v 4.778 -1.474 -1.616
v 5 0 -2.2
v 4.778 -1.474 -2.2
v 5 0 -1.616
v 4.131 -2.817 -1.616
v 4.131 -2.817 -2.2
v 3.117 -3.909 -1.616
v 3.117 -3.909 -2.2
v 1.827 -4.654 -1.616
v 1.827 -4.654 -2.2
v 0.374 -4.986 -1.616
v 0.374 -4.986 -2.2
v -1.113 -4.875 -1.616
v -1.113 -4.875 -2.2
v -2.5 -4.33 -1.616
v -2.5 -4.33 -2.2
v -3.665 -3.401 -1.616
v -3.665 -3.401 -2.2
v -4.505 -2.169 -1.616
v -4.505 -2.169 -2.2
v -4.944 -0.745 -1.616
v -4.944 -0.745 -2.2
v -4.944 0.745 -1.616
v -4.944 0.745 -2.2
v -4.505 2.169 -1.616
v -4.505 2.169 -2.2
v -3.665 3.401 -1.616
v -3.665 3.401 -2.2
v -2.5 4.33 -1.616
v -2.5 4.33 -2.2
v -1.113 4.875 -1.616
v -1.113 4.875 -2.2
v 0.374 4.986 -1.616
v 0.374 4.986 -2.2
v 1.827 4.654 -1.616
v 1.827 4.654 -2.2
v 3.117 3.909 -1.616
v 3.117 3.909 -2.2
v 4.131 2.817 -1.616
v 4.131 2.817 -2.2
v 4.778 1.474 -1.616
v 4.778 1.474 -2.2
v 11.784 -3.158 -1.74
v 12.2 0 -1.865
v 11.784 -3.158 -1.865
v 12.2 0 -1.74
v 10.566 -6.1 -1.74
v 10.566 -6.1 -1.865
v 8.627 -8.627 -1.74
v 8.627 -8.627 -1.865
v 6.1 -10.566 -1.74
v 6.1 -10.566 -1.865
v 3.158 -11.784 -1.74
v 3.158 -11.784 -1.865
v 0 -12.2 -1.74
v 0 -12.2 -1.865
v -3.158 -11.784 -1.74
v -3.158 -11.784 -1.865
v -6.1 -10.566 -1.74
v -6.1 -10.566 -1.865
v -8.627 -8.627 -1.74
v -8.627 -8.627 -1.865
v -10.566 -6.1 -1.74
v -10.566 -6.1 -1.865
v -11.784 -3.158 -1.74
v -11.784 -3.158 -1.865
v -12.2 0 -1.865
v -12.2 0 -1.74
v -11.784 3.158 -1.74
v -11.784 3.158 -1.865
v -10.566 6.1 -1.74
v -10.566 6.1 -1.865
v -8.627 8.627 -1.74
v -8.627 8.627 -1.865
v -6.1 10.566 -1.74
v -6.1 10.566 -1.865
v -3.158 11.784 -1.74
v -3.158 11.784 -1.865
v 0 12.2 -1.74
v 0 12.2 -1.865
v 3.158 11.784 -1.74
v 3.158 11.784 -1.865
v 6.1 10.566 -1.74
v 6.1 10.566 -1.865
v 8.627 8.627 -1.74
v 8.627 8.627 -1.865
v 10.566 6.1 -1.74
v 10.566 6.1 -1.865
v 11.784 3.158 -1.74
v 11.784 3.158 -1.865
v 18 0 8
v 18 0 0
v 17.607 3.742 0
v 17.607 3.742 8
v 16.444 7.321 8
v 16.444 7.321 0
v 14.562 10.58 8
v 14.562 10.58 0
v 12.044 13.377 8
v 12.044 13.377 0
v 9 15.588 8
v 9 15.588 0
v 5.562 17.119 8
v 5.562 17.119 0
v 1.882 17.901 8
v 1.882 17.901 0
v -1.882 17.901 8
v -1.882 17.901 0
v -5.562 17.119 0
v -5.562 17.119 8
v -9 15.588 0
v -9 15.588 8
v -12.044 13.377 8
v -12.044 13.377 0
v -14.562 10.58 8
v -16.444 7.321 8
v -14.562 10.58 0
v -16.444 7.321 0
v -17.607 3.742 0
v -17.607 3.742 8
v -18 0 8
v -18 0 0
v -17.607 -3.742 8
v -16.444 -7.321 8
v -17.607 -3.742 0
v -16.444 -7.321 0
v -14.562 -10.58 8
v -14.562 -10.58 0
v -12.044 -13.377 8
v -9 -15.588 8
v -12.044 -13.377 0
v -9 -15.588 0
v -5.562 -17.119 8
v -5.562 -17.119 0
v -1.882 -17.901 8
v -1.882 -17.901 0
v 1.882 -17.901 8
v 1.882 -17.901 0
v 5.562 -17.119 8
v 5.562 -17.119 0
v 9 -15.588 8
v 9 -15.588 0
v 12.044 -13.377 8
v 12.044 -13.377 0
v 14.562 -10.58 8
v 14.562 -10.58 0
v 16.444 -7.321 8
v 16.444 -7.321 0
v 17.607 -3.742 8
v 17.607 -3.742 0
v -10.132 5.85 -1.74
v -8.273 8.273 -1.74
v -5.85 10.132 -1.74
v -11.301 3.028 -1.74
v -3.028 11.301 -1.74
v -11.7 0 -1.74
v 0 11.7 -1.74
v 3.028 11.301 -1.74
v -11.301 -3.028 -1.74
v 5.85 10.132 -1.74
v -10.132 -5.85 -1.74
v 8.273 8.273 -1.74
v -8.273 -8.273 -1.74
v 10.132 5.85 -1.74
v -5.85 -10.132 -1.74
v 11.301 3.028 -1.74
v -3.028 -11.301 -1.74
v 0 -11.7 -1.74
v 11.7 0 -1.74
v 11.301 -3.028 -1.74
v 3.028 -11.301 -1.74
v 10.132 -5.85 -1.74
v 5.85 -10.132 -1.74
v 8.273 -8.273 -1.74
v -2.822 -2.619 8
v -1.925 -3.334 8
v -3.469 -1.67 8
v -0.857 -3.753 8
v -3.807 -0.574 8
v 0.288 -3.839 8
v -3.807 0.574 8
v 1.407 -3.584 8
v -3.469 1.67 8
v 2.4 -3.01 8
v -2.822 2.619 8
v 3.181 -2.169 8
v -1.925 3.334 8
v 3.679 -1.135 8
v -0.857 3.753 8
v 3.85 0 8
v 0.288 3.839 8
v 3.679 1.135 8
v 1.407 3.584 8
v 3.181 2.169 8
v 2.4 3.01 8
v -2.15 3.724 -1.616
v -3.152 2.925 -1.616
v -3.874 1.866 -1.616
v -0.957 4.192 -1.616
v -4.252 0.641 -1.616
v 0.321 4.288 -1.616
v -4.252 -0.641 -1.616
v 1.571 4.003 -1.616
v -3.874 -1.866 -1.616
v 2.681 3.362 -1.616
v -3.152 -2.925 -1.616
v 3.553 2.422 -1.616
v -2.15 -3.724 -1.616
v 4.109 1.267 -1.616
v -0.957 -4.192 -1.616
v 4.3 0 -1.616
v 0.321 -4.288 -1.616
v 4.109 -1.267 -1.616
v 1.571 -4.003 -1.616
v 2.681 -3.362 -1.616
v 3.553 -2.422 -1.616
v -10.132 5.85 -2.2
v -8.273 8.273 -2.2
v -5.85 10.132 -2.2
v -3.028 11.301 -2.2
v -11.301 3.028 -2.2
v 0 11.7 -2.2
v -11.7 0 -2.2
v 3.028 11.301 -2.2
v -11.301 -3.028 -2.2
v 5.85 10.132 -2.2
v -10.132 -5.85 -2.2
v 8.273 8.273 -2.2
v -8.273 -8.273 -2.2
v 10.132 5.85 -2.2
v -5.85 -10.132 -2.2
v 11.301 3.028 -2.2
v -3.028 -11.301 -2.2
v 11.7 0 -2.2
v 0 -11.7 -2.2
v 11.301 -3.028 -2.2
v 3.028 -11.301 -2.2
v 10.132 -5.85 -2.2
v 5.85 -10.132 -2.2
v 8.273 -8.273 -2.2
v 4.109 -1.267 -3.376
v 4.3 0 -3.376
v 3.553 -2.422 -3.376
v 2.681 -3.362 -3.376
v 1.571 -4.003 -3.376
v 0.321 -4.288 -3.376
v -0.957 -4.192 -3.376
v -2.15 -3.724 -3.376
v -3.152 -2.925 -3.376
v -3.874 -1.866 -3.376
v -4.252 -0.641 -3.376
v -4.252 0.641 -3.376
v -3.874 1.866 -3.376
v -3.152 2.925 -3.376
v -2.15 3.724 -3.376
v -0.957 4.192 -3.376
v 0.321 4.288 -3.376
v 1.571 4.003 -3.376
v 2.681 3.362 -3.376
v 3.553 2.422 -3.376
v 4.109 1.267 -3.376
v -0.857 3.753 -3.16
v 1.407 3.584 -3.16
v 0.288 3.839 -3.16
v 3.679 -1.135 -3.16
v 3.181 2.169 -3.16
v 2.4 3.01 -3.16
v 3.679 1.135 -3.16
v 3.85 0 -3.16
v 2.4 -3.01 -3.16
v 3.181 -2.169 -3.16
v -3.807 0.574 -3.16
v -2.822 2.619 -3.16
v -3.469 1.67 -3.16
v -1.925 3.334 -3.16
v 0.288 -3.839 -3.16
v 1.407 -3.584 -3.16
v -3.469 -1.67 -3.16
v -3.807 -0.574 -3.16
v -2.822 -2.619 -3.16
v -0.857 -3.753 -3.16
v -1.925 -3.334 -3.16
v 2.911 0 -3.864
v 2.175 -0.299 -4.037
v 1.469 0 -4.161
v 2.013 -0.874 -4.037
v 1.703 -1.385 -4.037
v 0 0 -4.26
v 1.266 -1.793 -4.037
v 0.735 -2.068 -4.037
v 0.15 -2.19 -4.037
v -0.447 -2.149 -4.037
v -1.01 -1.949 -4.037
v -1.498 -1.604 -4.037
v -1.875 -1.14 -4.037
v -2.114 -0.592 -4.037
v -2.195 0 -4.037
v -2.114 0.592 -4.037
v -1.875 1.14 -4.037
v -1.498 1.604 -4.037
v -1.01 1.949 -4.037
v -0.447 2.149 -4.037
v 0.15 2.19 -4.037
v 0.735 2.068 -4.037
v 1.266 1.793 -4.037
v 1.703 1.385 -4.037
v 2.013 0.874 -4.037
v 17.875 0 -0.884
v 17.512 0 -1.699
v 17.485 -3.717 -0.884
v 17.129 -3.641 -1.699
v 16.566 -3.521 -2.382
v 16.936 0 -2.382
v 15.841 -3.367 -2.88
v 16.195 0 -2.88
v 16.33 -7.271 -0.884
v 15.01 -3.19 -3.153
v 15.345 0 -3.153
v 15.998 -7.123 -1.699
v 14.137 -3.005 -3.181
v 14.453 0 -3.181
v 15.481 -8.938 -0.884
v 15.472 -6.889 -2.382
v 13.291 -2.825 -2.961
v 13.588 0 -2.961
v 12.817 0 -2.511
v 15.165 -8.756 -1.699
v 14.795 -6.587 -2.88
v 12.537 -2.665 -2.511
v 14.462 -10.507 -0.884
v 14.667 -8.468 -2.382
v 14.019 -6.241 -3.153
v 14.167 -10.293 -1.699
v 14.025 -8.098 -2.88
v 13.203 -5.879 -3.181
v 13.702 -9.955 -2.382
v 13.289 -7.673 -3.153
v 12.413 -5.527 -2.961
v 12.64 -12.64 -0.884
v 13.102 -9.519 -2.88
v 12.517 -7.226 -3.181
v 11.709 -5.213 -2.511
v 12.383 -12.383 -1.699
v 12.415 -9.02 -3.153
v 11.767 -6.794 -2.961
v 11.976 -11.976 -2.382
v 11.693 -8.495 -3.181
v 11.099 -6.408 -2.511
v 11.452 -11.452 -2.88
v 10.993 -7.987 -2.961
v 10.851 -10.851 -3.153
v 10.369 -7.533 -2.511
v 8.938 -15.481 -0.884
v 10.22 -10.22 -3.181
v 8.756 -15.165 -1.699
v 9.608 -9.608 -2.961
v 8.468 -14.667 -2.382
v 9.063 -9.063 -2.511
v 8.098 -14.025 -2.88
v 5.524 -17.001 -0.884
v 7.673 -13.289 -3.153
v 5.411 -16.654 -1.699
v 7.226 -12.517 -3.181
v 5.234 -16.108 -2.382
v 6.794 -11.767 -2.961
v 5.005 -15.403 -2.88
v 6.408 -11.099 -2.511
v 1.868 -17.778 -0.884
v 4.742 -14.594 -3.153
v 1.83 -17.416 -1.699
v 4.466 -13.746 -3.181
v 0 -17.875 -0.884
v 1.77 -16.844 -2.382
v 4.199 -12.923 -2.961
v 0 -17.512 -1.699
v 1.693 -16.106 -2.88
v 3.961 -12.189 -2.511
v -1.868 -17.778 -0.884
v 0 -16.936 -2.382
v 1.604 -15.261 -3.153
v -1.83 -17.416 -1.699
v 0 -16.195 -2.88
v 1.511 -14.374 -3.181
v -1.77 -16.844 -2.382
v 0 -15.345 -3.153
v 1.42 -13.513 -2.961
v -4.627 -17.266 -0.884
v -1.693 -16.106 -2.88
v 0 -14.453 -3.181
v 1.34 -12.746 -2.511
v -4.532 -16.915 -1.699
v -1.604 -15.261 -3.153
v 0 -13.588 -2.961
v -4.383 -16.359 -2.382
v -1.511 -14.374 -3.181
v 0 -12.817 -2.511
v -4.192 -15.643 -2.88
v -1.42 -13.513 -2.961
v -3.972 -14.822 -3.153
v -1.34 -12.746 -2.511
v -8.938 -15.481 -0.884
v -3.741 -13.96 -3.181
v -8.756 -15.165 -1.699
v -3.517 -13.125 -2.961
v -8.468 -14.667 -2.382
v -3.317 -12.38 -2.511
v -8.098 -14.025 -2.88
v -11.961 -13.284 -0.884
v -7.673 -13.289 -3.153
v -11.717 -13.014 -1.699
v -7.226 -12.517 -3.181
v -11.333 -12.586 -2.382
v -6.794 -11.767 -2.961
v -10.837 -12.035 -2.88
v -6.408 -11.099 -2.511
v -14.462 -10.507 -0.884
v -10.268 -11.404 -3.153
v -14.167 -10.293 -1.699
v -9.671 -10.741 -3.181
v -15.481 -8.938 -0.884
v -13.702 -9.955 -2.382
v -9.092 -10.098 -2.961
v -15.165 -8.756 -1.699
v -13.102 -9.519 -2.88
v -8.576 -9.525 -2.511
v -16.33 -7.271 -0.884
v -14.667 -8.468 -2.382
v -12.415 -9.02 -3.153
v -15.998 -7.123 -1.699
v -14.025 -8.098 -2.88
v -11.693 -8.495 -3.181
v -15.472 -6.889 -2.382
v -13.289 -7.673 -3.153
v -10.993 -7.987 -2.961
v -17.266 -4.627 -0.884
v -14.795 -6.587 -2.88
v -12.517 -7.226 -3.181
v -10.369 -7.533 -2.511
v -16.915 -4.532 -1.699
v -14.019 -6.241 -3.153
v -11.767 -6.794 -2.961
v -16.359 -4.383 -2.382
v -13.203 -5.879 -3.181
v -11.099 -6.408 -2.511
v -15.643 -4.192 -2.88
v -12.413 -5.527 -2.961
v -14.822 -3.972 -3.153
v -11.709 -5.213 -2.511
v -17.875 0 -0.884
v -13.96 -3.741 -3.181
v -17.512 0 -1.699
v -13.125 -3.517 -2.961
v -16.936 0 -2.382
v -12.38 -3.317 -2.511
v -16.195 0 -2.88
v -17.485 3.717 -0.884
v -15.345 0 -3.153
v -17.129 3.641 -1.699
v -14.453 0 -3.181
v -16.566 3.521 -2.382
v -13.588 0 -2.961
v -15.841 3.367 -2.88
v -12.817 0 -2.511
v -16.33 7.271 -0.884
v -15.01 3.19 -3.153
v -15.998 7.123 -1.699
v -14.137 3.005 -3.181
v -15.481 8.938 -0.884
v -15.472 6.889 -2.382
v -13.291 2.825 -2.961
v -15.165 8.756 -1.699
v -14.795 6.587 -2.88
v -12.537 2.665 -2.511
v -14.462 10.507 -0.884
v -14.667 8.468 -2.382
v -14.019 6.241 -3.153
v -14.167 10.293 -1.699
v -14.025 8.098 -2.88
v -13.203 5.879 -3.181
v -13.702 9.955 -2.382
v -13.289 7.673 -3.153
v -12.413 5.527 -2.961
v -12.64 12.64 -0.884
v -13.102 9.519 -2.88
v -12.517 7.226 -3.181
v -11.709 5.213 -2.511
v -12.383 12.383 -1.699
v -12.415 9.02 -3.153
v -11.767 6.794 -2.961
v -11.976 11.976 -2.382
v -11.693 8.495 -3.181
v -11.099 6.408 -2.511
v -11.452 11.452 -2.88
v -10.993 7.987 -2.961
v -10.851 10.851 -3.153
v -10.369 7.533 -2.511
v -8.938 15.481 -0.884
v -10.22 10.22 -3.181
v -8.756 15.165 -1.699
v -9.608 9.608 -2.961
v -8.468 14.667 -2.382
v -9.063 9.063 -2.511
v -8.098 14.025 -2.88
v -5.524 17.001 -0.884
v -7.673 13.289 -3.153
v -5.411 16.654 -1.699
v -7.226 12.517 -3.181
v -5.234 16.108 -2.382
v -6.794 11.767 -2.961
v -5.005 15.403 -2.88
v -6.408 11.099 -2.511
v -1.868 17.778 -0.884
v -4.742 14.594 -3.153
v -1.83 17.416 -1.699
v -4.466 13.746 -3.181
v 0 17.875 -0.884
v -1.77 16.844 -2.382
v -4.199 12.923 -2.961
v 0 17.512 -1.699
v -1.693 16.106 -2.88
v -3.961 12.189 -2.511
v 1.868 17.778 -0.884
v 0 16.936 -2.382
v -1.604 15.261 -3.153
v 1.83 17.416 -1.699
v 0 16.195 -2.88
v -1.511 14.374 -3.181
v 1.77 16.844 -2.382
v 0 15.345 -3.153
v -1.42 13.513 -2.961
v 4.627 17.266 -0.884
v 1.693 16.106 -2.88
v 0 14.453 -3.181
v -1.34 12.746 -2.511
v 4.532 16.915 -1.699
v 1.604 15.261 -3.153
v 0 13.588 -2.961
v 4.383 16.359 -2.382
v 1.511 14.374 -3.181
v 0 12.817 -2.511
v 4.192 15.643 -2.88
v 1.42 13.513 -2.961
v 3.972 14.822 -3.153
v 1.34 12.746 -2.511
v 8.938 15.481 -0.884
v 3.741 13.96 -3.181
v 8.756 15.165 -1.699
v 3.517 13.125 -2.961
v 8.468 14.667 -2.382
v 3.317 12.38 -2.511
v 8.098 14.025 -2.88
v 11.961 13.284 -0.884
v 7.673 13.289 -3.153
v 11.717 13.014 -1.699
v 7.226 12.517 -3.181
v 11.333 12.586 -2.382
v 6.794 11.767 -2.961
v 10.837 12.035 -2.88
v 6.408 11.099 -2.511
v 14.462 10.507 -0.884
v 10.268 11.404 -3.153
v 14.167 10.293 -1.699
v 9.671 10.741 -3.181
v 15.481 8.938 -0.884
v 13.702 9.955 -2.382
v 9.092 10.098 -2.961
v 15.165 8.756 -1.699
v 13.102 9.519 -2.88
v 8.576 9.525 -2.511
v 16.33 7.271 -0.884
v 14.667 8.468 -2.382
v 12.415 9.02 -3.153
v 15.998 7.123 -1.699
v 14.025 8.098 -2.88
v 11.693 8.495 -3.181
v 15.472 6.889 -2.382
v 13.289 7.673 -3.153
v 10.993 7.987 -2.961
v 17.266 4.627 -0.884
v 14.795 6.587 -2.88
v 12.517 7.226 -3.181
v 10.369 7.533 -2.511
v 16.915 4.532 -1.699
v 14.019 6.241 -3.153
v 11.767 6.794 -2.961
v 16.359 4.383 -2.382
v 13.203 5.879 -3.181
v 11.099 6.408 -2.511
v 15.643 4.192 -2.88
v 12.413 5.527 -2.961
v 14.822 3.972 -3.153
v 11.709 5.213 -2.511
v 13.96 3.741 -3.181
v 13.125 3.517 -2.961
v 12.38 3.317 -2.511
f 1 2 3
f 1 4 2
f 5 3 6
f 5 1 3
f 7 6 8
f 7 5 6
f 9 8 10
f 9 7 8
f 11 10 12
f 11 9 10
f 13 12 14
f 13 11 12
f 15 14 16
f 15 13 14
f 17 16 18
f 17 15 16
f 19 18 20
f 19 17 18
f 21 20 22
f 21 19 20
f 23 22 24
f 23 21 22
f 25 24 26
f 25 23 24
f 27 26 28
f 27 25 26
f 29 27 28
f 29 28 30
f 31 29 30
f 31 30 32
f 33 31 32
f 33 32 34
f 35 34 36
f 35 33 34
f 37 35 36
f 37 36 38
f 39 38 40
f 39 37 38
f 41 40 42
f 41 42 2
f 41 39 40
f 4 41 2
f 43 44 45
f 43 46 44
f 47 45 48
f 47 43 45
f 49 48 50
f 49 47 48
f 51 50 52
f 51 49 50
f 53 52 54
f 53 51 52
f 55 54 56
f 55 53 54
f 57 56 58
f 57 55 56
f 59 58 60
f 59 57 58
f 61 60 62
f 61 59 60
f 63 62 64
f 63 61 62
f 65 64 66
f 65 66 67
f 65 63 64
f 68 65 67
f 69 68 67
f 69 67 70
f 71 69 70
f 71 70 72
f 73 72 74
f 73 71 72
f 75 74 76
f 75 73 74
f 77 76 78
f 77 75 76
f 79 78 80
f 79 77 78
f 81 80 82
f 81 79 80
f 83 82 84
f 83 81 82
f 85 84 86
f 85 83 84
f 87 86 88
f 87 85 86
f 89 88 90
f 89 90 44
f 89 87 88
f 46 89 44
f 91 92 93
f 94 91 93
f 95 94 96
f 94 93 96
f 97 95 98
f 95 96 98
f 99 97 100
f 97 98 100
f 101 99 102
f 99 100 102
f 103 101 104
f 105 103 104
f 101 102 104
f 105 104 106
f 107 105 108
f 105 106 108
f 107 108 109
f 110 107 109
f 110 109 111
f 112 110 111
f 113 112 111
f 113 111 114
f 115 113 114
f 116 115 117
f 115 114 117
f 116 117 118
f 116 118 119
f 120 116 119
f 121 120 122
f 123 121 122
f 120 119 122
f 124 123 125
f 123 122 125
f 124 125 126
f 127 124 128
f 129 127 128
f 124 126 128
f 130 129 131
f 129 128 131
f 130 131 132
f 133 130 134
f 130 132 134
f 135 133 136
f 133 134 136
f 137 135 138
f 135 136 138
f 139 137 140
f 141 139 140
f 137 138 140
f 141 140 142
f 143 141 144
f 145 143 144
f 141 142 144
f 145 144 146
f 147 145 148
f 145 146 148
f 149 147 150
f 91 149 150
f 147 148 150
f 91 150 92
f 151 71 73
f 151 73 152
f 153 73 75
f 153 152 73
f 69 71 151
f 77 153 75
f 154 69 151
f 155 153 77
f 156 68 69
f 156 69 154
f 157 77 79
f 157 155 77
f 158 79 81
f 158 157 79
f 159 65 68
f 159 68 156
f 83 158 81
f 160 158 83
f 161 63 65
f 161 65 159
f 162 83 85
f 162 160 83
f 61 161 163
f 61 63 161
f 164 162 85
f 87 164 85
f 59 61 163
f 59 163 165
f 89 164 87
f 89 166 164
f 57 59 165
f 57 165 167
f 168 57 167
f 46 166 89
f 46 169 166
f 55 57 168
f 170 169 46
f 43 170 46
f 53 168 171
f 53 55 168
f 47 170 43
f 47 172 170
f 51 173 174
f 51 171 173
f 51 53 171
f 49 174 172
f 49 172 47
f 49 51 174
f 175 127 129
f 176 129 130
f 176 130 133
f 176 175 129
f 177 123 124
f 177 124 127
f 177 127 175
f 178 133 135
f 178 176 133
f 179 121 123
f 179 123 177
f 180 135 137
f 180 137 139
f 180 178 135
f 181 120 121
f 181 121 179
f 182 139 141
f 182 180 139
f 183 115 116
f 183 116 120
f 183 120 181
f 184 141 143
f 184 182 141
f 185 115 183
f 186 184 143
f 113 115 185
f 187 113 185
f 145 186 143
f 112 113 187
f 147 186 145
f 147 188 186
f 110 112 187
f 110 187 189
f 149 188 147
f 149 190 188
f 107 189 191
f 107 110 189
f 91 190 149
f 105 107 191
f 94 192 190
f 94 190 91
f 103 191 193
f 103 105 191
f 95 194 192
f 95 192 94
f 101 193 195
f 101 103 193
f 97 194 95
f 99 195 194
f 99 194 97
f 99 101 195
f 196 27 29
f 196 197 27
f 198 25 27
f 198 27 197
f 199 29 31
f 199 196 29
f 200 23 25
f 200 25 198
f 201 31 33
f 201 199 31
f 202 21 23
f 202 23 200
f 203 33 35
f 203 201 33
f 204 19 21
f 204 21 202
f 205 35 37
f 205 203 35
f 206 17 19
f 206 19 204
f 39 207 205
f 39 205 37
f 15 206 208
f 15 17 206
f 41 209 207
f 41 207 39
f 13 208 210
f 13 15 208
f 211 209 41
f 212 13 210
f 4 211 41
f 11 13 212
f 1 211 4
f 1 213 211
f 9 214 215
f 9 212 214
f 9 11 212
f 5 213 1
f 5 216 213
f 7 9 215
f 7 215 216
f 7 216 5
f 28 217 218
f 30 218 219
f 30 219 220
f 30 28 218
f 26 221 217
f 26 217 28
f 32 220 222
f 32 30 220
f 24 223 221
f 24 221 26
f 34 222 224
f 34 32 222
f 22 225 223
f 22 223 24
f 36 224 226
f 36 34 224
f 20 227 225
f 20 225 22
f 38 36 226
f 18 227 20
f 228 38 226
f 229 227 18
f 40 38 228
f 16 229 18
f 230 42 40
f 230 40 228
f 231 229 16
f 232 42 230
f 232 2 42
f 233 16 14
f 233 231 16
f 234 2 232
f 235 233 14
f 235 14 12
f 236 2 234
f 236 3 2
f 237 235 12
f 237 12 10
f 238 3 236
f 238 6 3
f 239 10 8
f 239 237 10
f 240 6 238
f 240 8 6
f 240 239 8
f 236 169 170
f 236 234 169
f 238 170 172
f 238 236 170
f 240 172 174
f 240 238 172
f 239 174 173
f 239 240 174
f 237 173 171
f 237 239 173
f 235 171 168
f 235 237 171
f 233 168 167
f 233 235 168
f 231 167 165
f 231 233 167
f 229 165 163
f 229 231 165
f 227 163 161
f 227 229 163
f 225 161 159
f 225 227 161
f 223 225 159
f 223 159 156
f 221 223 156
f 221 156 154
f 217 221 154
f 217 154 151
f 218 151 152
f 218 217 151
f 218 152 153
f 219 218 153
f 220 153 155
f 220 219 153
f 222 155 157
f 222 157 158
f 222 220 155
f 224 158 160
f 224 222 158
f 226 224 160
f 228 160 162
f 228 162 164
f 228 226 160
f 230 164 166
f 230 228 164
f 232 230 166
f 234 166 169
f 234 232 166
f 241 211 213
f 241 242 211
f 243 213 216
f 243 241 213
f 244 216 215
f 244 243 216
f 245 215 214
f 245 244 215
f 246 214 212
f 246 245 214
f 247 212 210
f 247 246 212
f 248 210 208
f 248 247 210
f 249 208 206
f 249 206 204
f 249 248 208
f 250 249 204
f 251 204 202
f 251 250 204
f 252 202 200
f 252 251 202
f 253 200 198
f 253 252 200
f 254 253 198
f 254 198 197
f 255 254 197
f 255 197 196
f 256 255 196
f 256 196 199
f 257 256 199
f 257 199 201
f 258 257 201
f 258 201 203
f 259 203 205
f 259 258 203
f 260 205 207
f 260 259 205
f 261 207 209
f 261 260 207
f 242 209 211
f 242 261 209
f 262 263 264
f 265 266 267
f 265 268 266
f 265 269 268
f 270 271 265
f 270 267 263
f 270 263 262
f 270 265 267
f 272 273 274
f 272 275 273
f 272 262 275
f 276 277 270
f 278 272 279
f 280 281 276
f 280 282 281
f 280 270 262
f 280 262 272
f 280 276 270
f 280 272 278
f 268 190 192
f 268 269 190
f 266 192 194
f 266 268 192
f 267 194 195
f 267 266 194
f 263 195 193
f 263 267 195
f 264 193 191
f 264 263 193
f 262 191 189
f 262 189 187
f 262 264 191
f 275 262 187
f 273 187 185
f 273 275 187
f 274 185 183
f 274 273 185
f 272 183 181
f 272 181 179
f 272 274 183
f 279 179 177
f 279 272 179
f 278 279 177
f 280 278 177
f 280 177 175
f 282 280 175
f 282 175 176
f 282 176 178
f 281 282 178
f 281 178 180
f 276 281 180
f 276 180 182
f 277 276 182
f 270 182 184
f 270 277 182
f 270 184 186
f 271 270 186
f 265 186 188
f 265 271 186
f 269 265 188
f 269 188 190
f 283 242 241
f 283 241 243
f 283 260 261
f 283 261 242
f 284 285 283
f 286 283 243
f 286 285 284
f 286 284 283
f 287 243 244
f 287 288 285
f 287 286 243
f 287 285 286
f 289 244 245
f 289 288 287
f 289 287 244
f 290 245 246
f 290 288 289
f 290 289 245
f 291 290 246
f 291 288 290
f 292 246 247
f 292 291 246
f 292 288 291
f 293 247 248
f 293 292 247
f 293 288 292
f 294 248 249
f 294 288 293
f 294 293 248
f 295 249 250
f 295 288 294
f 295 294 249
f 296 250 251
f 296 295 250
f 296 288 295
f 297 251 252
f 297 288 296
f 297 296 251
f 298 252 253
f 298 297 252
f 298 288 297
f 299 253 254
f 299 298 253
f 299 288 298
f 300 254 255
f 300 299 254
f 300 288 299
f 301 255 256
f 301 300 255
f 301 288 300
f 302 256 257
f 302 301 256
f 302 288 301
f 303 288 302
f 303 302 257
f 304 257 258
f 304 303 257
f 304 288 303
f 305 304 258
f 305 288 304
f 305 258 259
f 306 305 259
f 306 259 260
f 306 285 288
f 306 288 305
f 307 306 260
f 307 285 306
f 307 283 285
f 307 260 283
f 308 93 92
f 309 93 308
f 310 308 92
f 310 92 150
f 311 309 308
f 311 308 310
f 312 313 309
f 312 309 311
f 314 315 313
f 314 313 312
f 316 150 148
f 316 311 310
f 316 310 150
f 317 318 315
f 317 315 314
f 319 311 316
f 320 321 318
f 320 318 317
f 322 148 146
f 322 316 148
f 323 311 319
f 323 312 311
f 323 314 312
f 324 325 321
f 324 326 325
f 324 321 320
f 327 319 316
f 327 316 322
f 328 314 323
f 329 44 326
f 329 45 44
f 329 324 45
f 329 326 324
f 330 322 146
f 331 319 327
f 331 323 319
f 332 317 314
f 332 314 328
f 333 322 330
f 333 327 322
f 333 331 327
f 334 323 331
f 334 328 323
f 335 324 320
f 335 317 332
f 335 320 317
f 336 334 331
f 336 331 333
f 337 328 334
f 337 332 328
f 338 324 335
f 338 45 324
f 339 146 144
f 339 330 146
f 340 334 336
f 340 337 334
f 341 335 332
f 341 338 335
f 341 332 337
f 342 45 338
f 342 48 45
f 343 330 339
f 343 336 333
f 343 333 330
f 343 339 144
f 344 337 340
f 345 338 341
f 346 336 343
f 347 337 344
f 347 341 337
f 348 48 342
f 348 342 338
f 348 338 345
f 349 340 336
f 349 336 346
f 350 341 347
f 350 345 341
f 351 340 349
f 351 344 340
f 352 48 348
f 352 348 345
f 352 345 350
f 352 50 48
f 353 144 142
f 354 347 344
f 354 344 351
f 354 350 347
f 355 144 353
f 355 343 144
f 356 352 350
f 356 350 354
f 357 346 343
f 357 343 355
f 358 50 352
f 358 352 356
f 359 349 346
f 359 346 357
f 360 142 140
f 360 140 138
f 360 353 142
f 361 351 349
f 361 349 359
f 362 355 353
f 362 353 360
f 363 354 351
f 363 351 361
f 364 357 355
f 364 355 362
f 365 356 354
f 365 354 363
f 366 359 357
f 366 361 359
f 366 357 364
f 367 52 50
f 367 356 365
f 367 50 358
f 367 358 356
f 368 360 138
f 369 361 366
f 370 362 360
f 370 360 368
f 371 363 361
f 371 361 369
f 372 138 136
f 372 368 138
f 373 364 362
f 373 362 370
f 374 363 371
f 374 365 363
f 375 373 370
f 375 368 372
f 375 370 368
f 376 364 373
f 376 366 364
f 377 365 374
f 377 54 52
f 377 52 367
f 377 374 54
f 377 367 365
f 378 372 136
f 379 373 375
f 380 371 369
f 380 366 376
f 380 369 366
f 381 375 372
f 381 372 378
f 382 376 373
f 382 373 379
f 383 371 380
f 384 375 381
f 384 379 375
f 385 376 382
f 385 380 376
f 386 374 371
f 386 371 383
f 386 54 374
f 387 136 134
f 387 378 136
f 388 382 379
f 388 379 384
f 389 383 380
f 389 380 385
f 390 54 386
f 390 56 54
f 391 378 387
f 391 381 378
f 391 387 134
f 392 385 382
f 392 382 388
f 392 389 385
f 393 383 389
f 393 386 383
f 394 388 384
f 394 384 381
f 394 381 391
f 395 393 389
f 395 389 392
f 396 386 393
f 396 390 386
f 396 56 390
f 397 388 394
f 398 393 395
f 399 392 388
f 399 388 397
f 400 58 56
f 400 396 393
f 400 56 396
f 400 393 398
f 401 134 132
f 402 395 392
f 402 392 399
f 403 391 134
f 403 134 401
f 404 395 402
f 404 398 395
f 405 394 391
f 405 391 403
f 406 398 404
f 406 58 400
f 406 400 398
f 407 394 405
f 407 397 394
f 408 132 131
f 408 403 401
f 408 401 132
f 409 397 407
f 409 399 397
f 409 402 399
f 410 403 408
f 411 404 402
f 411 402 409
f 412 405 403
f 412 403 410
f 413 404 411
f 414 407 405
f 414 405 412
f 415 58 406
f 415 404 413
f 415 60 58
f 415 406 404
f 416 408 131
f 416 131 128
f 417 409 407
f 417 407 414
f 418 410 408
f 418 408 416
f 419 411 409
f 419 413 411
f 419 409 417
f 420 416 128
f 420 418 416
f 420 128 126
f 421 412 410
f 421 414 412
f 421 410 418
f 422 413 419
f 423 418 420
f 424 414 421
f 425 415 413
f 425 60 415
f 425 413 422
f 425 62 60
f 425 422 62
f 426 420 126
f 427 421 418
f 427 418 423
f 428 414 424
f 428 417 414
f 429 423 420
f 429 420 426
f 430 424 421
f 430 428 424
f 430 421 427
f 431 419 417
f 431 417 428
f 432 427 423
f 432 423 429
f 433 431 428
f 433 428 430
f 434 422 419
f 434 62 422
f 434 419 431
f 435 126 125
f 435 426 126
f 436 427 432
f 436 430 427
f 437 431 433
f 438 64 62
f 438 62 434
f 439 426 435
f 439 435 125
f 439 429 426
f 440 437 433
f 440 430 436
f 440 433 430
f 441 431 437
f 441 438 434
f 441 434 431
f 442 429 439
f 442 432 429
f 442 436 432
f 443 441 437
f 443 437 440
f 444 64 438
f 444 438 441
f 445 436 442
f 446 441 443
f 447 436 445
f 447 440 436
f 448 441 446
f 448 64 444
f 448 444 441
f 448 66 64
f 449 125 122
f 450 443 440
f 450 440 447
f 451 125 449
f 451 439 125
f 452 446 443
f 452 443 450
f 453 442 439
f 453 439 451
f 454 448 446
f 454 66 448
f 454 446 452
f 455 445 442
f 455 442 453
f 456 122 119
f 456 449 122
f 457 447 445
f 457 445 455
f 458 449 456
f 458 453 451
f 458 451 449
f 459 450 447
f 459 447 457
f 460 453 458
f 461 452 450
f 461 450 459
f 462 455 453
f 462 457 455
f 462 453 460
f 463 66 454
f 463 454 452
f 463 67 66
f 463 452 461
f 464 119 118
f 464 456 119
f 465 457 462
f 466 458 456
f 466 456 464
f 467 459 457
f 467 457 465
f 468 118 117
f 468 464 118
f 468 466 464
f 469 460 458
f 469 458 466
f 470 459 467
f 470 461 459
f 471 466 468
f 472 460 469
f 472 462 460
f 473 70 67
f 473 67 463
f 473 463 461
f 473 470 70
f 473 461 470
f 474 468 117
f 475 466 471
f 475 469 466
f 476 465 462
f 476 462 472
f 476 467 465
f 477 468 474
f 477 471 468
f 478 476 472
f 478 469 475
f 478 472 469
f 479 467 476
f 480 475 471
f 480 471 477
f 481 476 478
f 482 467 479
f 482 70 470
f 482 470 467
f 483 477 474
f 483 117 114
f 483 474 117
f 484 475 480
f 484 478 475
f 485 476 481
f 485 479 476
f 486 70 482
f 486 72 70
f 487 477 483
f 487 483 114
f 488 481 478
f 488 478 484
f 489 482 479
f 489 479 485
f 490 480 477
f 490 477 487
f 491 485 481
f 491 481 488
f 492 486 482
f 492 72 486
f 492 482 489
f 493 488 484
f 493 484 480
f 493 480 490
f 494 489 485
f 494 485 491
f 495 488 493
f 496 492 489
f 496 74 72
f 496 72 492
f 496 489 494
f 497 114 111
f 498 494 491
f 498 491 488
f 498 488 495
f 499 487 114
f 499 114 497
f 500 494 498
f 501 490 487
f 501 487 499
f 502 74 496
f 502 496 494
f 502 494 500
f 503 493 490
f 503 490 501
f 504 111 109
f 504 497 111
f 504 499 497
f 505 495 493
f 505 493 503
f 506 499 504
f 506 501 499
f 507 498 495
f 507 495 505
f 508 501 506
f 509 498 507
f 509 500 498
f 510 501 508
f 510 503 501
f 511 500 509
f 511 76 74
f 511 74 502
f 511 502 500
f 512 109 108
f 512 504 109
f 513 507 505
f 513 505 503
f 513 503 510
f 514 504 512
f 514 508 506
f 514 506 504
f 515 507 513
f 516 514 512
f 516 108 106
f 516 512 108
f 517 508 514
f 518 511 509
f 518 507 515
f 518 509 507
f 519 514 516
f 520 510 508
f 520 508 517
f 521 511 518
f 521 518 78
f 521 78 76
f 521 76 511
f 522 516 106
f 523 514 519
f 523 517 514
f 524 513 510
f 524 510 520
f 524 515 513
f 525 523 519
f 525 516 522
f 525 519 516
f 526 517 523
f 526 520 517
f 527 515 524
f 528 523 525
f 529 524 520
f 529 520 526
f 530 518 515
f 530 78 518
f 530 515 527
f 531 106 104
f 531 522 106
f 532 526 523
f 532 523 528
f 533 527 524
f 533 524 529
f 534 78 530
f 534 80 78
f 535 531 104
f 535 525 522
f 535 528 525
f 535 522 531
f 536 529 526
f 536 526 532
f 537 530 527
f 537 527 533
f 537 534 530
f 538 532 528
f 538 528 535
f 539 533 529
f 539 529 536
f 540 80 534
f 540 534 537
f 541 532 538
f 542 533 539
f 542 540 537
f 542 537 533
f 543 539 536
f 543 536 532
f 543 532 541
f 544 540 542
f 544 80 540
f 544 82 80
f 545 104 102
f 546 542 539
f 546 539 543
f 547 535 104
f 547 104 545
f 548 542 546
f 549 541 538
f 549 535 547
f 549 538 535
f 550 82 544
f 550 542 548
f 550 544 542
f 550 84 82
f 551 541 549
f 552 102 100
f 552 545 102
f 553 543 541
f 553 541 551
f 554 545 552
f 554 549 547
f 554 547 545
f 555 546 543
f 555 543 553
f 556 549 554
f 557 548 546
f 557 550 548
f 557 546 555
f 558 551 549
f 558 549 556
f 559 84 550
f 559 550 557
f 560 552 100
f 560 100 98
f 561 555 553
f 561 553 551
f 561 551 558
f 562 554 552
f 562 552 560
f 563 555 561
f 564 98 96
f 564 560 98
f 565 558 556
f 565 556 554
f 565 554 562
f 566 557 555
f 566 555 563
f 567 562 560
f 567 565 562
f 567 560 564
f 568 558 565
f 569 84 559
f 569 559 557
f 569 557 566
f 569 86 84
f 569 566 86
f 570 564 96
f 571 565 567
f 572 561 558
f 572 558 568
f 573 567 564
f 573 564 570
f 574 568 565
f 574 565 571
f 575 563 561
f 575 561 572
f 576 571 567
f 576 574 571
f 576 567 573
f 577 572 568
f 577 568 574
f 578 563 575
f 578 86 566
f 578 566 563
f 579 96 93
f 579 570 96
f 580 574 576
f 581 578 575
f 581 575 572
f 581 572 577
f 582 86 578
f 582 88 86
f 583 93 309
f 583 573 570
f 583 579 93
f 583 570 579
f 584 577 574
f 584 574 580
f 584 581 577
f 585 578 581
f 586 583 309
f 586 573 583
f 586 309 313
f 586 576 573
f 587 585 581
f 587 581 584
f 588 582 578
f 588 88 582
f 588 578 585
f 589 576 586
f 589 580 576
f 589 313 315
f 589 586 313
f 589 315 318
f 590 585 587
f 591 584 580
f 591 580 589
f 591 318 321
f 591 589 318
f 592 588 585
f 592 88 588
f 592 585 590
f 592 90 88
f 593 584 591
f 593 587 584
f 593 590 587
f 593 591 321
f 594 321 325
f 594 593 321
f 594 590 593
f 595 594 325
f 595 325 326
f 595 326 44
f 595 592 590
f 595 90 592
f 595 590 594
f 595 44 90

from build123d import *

# Parameters (mm, degrees)
SKETCH4_R           = 18
SKETCH4_R_2         = 3.85
BOSS_EXTRUDE1_DEPTH = 8


with BuildPart() as part:
    # Sketch3 → Revolve2 (revolve)
    with BuildSketch(Plane(origin=(0, 0, 0), x_dir=(1, 0, 0), z_dir=(0, 1, 0))):
        with BuildLine():
            Line((0, 3.160044373), (3.85, 3.160044373))
            Line((3.85, 3.160044373), (3.85, 0))
            Line((3.85, 0), (18, 0))
            ThreePointArc((18, 0), (15.779795897, 3.046309242), (12.2, 1.865475811))
            Line((12.2, 1.865475811), (12.2, 1.74))
            Line((12.2, 1.74), (11.7, 1.74))
            Line((11.7, 1.74), (11.7, 2.2))
            Line((11.7, 2.2), (5, 2.2))
            Line((5, 2.2), (5, 1.61598722))
            Line((5, 1.61598722), (4.3, 1.61598722))
            Line((4.3, 1.61598722), (4.3, 3.376031593))
            ThreePointArc((4.3, 3.376031593), (2.194964612, 4.036754088), (0, 4.260044373))
            Line((0, 4.260044373), (0, 3.160044373))
        make_face()
    revolve(axis=Axis((0, 0, 0), (0, 0, -1)))

    # Sketch4 → Boss-Extrude1 (add)
    with BuildSketch(Plane.XY):
        Circle(SKETCH4_R)
        Circle(SKETCH4_R_2, mode=Mode.SUBTRACT)
    extrude(amount=BOSS_EXTRUDE1_DEPTH)


solid = part.part
